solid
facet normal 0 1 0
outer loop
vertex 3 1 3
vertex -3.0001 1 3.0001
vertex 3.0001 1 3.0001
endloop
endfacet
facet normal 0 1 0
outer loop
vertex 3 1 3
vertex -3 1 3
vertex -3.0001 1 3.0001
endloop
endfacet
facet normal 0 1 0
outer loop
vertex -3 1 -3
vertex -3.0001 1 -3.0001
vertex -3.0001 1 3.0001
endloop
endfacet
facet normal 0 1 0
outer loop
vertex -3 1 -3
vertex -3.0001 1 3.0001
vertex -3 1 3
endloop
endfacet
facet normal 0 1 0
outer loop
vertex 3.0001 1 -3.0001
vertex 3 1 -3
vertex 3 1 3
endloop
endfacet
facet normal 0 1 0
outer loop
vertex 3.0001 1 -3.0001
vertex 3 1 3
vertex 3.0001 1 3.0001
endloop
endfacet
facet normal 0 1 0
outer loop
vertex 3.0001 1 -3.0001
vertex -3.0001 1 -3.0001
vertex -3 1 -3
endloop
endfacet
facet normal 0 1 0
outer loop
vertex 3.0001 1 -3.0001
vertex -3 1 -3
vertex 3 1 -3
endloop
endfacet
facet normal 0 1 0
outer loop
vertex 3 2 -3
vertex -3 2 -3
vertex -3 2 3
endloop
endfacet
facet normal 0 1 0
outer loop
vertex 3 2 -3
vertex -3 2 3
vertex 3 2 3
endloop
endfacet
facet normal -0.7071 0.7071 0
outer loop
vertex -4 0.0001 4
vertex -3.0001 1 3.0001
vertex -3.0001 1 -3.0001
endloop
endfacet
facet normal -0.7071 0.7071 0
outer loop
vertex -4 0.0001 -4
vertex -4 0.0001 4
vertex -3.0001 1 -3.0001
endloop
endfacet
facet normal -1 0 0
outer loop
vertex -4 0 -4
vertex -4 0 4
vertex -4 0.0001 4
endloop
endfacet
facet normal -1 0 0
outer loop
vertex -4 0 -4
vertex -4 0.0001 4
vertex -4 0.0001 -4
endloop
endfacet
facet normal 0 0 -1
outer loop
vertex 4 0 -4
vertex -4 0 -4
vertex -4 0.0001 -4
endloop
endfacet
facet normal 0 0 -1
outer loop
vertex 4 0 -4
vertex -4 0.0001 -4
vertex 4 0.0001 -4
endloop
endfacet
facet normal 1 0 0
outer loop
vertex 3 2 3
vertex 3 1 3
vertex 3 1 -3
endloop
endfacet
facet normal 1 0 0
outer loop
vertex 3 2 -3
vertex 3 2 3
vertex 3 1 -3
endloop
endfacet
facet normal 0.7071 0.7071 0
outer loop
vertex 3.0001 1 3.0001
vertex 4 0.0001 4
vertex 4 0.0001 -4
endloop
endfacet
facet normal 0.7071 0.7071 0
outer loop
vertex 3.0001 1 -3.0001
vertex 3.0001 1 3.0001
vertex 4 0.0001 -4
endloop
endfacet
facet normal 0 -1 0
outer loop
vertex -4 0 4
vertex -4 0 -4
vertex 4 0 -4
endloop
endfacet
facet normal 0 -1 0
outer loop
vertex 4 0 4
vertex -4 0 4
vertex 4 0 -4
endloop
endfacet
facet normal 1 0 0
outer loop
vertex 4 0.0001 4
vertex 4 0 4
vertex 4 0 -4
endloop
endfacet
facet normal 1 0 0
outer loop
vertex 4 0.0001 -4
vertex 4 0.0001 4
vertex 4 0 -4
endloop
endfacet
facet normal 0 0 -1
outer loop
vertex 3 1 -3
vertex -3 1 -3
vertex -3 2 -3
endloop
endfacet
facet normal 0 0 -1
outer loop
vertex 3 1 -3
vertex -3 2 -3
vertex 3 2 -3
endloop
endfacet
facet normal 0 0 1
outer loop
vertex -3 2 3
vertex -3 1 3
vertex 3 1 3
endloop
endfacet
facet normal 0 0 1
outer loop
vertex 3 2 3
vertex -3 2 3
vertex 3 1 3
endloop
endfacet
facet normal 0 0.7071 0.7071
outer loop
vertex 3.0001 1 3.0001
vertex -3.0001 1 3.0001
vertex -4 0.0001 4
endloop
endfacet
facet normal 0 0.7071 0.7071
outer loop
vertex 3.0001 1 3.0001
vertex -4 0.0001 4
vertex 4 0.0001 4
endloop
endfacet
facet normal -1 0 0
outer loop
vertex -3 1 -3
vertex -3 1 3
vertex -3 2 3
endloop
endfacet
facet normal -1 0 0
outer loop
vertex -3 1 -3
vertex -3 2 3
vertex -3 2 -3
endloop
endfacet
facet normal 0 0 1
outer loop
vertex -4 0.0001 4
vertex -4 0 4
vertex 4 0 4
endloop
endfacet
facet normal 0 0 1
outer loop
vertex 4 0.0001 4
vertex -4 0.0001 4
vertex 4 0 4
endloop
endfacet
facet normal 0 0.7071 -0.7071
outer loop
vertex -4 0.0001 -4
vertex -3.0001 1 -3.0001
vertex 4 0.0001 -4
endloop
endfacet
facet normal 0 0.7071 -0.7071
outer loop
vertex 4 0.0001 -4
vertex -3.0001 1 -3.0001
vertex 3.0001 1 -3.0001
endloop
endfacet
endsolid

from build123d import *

# Parameters (mm, degrees)
SKETCH_1_W      = 6
SKETCH_1_H      = 6
EXTRUDE_1_DEPTH = 2
SKETCH_3_W      = 8
SKETCH_3_H      = 8
EXTRUDE_2_DEPTH = 1
CHAMFER_1_SIZE  = 1


with BuildPart() as part:
    # 草图1 → 凸台-拉伸1 (new body)
    with BuildSketch(Plane(origin=(0, 0, 0), x_dir=(1, 0, 0), z_dir=(0, 1, 0))):
        Rectangle(SKETCH_1_W, SKETCH_1_H)
    extrude(amount=EXTRUDE_1_DEPTH)

    # 草图3 → 凸台-拉伸2 (add)
    with BuildSketch(Plane(origin=(0, 0, 0), x_dir=(1, 0, 0), z_dir=(0, 1, 0))):
        Rectangle(SKETCH_3_W, SKETCH_3_H)
    extrude(amount=EXTRUDE_2_DEPTH)

    # 倒角1
    chamfer_1_edges = [part.edges().sort_by_distance(p)[0] for p in [
        (0, 1, -4),
        (4, 1, 0),
        (0, 1, 4),
        (-4, 1, 0),
    ]]
    chamfer(chamfer_1_edges, length=CHAMFER_1_SIZE - 0.0001)  # a hair under: the kernel refuses the full size


solid = part.part
